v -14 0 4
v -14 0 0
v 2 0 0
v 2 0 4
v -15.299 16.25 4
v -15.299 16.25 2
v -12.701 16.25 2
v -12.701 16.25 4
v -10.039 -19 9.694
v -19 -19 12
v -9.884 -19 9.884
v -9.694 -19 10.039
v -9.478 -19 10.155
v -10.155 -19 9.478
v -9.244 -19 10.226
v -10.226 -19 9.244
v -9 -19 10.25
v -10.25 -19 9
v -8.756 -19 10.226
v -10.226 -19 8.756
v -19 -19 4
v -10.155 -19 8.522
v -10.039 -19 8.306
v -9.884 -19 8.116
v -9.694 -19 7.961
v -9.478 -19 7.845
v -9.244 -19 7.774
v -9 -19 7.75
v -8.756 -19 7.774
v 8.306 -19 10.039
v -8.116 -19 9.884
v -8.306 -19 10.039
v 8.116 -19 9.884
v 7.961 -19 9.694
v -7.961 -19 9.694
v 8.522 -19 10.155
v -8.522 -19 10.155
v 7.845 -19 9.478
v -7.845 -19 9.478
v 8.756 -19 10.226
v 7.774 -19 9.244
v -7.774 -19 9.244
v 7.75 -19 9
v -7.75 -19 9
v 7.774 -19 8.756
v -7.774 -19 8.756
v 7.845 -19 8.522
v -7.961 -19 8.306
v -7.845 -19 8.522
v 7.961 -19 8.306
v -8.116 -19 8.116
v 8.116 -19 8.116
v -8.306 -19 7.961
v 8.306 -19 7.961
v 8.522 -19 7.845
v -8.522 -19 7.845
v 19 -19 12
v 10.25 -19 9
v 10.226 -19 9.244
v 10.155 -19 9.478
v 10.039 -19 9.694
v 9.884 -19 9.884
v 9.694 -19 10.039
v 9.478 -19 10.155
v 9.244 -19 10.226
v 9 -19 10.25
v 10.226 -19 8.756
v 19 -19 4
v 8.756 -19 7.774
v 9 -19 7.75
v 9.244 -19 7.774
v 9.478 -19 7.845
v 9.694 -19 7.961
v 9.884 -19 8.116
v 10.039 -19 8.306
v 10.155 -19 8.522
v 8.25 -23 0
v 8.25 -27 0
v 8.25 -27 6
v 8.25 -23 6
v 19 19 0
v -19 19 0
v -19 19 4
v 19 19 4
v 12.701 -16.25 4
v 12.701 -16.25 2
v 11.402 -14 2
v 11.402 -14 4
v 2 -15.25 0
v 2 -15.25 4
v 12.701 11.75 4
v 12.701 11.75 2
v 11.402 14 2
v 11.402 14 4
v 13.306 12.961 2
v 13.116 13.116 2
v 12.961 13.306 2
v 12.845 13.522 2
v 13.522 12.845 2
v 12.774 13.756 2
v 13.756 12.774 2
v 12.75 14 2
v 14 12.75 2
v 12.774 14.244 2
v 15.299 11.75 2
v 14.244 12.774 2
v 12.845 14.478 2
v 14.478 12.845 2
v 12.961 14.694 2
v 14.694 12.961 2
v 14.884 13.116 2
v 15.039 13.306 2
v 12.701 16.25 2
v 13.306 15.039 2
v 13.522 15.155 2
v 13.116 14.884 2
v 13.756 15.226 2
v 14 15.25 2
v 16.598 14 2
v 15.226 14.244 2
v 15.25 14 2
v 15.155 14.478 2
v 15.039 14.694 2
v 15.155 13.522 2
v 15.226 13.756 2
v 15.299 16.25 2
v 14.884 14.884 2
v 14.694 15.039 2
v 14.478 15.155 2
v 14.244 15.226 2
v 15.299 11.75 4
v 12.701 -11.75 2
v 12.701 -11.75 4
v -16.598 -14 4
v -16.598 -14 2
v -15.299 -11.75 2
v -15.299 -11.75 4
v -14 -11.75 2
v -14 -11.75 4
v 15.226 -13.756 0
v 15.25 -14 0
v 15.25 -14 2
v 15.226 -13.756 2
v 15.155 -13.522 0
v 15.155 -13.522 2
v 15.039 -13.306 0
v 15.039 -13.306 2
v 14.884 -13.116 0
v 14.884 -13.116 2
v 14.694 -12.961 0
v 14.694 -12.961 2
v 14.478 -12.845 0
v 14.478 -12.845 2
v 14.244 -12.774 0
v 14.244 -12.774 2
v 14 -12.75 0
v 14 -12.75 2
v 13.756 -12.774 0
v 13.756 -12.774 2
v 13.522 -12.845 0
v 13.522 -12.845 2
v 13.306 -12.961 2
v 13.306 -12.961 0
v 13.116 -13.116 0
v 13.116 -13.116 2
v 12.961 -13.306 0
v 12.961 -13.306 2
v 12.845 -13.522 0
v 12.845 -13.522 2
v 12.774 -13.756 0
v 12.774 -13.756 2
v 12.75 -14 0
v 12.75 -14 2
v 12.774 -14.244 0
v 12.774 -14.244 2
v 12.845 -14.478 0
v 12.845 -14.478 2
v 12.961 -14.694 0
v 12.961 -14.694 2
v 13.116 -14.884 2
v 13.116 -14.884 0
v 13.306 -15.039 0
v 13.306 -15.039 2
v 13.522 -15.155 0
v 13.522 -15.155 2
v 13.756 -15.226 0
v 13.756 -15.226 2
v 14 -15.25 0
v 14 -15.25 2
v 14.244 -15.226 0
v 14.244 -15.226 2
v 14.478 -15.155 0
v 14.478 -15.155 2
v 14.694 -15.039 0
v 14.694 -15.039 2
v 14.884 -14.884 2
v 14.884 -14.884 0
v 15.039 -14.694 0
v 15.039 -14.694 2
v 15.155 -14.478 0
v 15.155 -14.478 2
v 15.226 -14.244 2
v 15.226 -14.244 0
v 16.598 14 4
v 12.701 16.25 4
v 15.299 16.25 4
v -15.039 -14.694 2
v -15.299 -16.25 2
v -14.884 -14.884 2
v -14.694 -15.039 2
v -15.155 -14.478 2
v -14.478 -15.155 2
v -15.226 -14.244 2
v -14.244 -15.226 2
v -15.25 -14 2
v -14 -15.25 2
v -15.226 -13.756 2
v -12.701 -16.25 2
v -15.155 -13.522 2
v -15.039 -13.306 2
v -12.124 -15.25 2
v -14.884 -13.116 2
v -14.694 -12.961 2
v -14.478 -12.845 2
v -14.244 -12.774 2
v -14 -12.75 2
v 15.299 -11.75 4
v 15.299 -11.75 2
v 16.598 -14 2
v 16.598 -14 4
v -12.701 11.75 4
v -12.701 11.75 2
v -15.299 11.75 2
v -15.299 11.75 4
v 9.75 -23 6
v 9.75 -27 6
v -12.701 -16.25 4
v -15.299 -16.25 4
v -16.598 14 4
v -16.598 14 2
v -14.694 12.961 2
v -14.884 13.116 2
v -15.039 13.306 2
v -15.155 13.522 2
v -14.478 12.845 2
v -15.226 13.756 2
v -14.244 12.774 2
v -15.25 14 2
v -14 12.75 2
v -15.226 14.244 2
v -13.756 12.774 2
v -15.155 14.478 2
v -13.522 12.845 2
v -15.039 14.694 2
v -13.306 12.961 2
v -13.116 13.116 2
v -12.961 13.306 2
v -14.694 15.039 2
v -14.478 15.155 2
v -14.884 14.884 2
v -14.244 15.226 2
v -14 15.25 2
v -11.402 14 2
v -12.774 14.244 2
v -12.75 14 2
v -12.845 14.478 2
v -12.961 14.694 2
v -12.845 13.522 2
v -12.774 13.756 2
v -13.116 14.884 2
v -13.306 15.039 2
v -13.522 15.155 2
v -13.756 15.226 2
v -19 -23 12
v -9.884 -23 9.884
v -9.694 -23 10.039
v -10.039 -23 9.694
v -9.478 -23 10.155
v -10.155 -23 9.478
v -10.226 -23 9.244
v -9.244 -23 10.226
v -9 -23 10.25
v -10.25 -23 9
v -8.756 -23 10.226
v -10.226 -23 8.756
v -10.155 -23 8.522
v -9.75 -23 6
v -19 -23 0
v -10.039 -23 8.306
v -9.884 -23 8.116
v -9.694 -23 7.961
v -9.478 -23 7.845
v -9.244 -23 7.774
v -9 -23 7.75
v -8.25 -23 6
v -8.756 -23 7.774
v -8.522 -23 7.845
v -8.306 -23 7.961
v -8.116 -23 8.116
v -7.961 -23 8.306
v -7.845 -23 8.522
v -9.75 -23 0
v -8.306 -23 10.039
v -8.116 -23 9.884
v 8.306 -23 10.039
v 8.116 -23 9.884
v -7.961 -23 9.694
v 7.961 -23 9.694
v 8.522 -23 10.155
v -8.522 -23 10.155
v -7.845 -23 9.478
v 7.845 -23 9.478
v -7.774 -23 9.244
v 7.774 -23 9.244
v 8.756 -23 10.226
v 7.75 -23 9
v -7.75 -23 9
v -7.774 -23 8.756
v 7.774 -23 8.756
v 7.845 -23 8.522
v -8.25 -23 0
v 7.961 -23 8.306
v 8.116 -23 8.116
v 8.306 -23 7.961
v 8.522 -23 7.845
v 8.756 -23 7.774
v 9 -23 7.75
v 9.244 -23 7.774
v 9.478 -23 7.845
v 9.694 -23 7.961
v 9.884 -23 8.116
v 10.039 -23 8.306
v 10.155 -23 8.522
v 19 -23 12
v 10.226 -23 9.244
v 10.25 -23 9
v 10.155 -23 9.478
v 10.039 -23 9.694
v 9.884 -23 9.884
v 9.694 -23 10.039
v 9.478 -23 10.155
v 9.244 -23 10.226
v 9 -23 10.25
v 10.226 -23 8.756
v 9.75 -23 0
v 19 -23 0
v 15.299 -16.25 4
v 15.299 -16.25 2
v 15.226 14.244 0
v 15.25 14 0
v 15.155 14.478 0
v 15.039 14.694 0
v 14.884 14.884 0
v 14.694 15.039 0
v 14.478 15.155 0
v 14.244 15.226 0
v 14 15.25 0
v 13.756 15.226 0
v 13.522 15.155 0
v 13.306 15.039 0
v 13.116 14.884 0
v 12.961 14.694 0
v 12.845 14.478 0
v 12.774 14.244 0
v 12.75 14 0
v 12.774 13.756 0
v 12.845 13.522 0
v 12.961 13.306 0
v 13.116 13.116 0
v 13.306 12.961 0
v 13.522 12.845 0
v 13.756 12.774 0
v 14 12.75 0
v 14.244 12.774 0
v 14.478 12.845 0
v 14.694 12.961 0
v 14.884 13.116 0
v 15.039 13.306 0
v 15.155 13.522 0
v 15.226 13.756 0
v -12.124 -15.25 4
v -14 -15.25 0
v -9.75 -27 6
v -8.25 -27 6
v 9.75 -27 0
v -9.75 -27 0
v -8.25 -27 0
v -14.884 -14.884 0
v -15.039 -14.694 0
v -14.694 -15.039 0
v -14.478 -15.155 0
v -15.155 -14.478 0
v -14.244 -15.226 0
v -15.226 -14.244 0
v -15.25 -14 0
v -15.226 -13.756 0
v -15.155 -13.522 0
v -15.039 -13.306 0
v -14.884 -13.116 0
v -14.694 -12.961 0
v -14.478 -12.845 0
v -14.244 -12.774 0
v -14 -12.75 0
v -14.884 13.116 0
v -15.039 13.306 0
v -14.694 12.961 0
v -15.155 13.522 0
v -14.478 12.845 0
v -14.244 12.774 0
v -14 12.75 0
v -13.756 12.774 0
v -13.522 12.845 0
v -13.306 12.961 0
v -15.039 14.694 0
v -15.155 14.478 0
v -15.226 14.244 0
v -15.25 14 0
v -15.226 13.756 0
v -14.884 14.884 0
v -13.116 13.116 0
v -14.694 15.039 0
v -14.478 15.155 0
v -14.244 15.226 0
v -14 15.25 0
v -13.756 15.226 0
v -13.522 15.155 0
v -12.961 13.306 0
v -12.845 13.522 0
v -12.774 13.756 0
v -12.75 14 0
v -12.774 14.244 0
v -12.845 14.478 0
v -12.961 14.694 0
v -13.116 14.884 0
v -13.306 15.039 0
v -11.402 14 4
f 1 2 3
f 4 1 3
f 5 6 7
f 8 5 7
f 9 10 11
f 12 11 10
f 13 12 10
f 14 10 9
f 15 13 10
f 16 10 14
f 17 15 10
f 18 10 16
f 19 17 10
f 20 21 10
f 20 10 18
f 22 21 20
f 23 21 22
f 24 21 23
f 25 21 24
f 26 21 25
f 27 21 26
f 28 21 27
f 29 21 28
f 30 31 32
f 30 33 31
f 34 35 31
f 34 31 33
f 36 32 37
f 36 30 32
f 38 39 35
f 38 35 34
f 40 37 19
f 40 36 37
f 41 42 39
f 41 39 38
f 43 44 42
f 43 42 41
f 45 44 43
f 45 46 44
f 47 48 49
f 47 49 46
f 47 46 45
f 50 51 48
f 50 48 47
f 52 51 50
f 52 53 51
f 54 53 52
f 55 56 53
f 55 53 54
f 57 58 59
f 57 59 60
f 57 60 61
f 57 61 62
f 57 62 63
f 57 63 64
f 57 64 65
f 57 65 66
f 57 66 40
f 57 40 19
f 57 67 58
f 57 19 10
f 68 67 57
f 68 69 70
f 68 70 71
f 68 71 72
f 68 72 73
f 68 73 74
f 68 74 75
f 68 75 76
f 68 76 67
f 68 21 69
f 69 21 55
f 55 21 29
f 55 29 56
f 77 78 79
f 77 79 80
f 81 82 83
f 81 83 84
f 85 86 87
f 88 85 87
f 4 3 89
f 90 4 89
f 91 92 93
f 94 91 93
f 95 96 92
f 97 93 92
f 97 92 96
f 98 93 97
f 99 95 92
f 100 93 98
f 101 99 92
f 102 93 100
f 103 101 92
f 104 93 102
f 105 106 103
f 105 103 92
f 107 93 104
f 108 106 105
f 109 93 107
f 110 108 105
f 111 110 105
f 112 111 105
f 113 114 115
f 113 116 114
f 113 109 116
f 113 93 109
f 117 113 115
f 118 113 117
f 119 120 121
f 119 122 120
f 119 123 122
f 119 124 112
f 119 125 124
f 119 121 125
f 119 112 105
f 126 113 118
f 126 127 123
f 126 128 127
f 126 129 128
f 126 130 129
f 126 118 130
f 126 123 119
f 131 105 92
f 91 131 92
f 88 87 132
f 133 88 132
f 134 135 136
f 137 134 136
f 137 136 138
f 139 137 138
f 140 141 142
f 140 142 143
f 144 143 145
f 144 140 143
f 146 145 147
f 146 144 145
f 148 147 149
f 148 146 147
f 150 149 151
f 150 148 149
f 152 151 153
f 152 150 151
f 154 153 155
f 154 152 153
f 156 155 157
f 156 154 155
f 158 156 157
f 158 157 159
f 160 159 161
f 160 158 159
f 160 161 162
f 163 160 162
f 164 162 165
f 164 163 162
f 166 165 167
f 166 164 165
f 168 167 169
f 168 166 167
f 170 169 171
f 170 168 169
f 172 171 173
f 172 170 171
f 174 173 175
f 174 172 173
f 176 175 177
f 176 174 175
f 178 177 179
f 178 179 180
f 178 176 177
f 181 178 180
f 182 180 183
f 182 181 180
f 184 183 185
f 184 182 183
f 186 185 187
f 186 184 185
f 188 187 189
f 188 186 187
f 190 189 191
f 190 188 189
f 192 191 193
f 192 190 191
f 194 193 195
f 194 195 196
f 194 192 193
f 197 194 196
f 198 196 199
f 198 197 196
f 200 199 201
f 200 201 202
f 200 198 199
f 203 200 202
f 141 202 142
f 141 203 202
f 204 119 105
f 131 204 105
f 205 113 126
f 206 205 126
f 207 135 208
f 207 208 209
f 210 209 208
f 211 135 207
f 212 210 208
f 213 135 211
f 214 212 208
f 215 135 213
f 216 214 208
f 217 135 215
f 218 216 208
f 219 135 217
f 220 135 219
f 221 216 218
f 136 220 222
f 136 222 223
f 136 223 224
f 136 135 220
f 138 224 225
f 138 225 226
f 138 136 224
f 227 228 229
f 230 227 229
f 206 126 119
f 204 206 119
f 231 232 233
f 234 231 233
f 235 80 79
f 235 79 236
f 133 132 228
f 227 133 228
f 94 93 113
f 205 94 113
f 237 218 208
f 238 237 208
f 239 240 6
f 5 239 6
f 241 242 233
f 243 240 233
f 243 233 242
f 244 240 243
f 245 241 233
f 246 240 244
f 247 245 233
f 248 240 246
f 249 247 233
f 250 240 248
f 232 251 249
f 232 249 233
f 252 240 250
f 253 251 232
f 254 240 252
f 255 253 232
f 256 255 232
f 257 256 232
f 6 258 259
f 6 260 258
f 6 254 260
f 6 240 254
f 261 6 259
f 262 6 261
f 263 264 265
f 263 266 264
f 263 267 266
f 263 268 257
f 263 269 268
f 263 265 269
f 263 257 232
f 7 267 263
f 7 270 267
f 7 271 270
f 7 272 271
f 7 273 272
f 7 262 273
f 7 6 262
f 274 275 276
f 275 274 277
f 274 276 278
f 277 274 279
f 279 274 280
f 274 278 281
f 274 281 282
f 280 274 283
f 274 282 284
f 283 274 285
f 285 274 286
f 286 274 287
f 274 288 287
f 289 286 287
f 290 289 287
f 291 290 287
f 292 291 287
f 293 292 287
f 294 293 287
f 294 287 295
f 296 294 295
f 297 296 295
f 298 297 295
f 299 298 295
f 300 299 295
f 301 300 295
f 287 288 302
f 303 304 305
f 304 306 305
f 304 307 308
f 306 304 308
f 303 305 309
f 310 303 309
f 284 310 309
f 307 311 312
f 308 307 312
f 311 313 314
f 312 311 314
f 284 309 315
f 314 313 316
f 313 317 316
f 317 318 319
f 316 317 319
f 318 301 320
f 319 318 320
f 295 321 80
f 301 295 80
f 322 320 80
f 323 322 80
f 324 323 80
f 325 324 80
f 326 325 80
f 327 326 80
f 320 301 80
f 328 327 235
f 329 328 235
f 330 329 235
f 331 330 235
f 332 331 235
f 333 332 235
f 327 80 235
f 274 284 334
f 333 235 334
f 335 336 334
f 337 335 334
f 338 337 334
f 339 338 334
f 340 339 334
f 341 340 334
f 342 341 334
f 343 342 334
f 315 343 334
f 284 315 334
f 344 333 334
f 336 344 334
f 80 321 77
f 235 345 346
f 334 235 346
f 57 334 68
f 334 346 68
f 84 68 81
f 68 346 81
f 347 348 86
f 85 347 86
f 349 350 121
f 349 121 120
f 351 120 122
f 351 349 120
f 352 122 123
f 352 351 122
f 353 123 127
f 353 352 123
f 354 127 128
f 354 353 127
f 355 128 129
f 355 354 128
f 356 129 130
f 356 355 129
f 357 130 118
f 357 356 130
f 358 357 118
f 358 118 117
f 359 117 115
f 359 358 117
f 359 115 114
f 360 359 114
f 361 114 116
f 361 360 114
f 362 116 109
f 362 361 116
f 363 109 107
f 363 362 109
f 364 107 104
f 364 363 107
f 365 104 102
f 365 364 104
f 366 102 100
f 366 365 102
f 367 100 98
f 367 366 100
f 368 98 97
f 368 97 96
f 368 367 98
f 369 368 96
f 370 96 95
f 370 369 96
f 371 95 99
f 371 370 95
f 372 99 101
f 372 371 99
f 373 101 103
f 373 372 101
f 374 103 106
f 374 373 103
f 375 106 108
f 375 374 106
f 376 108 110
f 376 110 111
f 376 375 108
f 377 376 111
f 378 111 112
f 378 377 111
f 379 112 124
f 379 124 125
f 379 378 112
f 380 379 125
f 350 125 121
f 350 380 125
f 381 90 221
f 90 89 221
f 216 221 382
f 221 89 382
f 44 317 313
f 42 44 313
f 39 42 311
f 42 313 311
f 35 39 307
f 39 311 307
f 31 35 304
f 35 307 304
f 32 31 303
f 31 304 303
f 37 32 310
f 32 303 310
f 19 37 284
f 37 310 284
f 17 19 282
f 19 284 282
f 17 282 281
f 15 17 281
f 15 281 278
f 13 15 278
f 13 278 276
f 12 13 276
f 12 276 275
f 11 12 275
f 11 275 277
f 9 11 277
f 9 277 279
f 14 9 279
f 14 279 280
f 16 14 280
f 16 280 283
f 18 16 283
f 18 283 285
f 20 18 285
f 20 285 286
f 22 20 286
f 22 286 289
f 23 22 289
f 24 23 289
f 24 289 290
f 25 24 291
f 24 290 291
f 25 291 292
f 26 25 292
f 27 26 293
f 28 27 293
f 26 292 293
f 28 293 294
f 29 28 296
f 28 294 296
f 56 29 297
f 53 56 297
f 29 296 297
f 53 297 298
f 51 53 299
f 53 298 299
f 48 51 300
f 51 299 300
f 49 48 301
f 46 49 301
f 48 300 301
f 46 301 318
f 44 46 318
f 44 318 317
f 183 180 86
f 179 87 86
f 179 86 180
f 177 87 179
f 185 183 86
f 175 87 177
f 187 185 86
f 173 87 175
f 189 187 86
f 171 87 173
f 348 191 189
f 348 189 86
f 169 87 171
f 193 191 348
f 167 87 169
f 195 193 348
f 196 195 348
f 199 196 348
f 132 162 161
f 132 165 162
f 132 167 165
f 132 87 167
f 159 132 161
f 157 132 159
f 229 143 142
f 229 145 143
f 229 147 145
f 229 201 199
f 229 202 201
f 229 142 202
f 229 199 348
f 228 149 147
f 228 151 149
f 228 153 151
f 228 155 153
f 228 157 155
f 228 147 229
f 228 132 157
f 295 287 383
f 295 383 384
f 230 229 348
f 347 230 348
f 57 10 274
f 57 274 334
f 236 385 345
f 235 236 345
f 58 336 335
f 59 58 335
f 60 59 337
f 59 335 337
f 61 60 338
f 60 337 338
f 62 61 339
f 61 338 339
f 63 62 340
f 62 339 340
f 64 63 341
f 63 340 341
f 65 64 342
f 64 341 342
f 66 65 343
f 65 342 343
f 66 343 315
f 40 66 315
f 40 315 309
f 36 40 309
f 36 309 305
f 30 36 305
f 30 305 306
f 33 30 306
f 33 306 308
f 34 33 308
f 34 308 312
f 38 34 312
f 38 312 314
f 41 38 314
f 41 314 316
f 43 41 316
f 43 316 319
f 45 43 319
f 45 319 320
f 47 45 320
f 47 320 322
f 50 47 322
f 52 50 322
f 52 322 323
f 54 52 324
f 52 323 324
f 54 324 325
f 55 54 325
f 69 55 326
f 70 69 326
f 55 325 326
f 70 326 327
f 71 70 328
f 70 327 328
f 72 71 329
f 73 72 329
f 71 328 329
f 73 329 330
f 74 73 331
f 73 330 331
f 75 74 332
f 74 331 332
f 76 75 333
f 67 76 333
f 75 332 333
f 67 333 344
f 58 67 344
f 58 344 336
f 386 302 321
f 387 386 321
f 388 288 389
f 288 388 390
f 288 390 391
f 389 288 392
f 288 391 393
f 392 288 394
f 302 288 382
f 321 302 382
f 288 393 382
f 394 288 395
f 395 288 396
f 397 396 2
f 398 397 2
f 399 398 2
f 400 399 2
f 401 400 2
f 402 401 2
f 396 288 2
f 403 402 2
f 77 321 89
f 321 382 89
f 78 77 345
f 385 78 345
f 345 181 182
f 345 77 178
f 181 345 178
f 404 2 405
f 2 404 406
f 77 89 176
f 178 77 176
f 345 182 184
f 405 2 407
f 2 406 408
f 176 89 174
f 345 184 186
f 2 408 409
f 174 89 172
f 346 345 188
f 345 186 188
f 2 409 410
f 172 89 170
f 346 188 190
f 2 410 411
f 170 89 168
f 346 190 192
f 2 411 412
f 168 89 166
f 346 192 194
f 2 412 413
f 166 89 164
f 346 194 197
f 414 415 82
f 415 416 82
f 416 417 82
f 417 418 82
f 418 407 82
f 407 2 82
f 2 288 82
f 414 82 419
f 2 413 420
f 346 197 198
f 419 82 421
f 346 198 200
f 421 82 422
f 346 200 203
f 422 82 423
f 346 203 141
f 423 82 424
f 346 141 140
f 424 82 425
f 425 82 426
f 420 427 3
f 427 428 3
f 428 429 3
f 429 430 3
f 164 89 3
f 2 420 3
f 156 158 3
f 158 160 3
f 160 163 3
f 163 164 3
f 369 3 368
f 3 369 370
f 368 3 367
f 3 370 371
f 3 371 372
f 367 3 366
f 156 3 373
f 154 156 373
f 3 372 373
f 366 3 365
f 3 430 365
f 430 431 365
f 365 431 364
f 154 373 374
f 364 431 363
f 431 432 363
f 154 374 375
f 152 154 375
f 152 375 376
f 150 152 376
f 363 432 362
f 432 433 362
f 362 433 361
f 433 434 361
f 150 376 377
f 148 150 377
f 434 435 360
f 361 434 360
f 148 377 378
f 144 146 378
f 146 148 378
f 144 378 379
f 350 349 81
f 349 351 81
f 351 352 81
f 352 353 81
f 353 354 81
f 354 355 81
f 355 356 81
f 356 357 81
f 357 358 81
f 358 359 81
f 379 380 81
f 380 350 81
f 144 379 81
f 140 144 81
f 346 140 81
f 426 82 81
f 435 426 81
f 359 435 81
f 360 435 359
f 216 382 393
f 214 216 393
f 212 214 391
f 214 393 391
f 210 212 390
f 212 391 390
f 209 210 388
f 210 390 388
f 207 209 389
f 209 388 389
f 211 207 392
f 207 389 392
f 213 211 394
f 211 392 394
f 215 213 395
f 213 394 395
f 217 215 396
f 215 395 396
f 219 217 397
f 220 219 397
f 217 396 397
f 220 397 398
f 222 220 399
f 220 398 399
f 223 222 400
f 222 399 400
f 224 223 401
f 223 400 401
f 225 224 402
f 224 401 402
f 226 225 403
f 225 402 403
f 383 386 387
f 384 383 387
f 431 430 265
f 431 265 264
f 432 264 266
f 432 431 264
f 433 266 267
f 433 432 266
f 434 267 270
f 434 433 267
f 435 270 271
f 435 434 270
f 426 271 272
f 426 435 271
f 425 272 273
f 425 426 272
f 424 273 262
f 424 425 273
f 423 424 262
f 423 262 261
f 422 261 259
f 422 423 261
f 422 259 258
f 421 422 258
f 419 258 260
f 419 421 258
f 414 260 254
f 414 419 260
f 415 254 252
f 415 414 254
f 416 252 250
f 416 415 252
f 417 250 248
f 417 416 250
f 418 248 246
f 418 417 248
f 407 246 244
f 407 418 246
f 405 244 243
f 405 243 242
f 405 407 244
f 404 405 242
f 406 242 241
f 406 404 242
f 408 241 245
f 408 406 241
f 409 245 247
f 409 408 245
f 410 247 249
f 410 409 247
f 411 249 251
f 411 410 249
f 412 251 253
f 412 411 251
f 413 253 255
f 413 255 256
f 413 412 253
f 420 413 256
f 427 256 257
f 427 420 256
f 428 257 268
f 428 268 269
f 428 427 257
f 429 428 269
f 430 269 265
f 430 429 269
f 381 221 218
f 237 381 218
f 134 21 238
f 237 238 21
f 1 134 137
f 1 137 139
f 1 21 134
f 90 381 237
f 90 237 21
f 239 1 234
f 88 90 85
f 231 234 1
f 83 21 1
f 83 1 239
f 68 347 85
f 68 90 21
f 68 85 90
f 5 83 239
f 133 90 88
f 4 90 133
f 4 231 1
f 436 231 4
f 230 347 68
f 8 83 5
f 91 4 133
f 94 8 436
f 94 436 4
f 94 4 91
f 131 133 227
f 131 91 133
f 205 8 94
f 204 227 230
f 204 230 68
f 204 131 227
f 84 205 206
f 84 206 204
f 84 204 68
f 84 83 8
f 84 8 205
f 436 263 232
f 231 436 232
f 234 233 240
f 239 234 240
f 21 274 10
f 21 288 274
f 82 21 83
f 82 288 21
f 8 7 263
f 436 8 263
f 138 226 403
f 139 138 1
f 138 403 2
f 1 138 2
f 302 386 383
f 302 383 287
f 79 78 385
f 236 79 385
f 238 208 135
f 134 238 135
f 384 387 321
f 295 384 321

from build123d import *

# Parameters (mm, degrees)
F0_R     = 1.25
F1_DEPTH = 2
F2_W     = 38
F2_H     = 42
F3_DEPTH = 2
F4_W     = 1.5
F4_H     = 4
F5_DEPTH = 6
F6_W     = 38
F6_H     = 4
F7_DEPTH = 8
F8_R     = 1.25
F9_DEPTH = 25


with BuildPart() as f1:
    # F0 (on Top) → F1 (new body)
    with BuildSketch(Plane.XY):
        Polygon((19, 19), (-19, 19), (-19, -23), (10, -23), (12, -23), (19, -23), align=None)
        with BuildLine():
            ThreePointArc((-14, -15.25), (-15.25, -14), (-14, -12.75))
            Line((-14, -12.75), (-14, 0))
            Line((-14, 0), (2, 0))
            Line((2, 0), (2, -15.25))
            Line((2, -15.25), (-14, -15.25))
        make_face(mode=Mode.SUBTRACT)
        with Locations((14, -14)):
            Circle(F0_R, mode=Mode.SUBTRACT)
        with Locations((-14, 14)):
            Circle(F0_R, mode=Mode.SUBTRACT)
        with Locations((14, 14)):
            Circle(F0_R, mode=Mode.SUBTRACT)
    extrude(amount=F1_DEPTH)

    # F2 (on face) → F3 (join)
    with BuildSketch(Plane.XY.offset(2)):
        with Locations((0, -2)):
            Rectangle(F2_W, F2_H)
        Polygon((2, -15.25), (-12.1236116251, -15.25), (-12.7009618943, -16.25), (-15.2990381057, -16.25), (-16.5980762114, -14), (-15.2990381057, -11.75), (-14, -11.75), (-14, 0), (2, 0), align=None, mode=Mode.SUBTRACT)
        Polygon((15.2990381057, -11.75), (16.5980762114, -14), (15.2990381057, -16.25), (12.7009618943, -16.25), (11.4019237886, -14), (12.7009618943, -11.75), align=None, mode=Mode.SUBTRACT)
        Polygon((-12.7009618943, 16.25), (-11.4019237886, 14), (-12.7009618943, 11.75), (-15.2990381057, 11.75), (-16.5980762114, 14), (-15.2990381057, 16.25), align=None, mode=Mode.SUBTRACT)
        Polygon((15.2990381057, 16.25), (16.5980762114, 14), (15.2990381057, 11.75), (12.7009618943, 11.75), (11.4019237886, 14), (12.7009618943, 16.25), align=None, mode=Mode.SUBTRACT)
    extrude(amount=F3_DEPTH)

    # F4 (on Top) → F5 (join)
    with BuildSketch(Plane.XY):
        with Locations((-9, -25)):
            Rectangle(F4_W, F4_H)
        with Locations((9, -25)):
            Rectangle(F4_W, F4_H)
    extrude(amount=F5_DEPTH)

    # F6 (on face) → F7 (join)
    with BuildSketch(Plane.XY.offset(4)):
        with Locations((0, -21)):
            Rectangle(F6_W, F6_H)
    extrude(amount=F7_DEPTH)

    # F8 (on face) → F9 (cut)
    with BuildSketch(Plane.XZ.offset(23)):
        with Locations((-9, 9)):
            Circle(F8_R)
        with Locations((9, 9)):
            Circle(F8_R)
    extrude(amount=-F9_DEPTH, mode=Mode.SUBTRACT)


solid = f1.part
